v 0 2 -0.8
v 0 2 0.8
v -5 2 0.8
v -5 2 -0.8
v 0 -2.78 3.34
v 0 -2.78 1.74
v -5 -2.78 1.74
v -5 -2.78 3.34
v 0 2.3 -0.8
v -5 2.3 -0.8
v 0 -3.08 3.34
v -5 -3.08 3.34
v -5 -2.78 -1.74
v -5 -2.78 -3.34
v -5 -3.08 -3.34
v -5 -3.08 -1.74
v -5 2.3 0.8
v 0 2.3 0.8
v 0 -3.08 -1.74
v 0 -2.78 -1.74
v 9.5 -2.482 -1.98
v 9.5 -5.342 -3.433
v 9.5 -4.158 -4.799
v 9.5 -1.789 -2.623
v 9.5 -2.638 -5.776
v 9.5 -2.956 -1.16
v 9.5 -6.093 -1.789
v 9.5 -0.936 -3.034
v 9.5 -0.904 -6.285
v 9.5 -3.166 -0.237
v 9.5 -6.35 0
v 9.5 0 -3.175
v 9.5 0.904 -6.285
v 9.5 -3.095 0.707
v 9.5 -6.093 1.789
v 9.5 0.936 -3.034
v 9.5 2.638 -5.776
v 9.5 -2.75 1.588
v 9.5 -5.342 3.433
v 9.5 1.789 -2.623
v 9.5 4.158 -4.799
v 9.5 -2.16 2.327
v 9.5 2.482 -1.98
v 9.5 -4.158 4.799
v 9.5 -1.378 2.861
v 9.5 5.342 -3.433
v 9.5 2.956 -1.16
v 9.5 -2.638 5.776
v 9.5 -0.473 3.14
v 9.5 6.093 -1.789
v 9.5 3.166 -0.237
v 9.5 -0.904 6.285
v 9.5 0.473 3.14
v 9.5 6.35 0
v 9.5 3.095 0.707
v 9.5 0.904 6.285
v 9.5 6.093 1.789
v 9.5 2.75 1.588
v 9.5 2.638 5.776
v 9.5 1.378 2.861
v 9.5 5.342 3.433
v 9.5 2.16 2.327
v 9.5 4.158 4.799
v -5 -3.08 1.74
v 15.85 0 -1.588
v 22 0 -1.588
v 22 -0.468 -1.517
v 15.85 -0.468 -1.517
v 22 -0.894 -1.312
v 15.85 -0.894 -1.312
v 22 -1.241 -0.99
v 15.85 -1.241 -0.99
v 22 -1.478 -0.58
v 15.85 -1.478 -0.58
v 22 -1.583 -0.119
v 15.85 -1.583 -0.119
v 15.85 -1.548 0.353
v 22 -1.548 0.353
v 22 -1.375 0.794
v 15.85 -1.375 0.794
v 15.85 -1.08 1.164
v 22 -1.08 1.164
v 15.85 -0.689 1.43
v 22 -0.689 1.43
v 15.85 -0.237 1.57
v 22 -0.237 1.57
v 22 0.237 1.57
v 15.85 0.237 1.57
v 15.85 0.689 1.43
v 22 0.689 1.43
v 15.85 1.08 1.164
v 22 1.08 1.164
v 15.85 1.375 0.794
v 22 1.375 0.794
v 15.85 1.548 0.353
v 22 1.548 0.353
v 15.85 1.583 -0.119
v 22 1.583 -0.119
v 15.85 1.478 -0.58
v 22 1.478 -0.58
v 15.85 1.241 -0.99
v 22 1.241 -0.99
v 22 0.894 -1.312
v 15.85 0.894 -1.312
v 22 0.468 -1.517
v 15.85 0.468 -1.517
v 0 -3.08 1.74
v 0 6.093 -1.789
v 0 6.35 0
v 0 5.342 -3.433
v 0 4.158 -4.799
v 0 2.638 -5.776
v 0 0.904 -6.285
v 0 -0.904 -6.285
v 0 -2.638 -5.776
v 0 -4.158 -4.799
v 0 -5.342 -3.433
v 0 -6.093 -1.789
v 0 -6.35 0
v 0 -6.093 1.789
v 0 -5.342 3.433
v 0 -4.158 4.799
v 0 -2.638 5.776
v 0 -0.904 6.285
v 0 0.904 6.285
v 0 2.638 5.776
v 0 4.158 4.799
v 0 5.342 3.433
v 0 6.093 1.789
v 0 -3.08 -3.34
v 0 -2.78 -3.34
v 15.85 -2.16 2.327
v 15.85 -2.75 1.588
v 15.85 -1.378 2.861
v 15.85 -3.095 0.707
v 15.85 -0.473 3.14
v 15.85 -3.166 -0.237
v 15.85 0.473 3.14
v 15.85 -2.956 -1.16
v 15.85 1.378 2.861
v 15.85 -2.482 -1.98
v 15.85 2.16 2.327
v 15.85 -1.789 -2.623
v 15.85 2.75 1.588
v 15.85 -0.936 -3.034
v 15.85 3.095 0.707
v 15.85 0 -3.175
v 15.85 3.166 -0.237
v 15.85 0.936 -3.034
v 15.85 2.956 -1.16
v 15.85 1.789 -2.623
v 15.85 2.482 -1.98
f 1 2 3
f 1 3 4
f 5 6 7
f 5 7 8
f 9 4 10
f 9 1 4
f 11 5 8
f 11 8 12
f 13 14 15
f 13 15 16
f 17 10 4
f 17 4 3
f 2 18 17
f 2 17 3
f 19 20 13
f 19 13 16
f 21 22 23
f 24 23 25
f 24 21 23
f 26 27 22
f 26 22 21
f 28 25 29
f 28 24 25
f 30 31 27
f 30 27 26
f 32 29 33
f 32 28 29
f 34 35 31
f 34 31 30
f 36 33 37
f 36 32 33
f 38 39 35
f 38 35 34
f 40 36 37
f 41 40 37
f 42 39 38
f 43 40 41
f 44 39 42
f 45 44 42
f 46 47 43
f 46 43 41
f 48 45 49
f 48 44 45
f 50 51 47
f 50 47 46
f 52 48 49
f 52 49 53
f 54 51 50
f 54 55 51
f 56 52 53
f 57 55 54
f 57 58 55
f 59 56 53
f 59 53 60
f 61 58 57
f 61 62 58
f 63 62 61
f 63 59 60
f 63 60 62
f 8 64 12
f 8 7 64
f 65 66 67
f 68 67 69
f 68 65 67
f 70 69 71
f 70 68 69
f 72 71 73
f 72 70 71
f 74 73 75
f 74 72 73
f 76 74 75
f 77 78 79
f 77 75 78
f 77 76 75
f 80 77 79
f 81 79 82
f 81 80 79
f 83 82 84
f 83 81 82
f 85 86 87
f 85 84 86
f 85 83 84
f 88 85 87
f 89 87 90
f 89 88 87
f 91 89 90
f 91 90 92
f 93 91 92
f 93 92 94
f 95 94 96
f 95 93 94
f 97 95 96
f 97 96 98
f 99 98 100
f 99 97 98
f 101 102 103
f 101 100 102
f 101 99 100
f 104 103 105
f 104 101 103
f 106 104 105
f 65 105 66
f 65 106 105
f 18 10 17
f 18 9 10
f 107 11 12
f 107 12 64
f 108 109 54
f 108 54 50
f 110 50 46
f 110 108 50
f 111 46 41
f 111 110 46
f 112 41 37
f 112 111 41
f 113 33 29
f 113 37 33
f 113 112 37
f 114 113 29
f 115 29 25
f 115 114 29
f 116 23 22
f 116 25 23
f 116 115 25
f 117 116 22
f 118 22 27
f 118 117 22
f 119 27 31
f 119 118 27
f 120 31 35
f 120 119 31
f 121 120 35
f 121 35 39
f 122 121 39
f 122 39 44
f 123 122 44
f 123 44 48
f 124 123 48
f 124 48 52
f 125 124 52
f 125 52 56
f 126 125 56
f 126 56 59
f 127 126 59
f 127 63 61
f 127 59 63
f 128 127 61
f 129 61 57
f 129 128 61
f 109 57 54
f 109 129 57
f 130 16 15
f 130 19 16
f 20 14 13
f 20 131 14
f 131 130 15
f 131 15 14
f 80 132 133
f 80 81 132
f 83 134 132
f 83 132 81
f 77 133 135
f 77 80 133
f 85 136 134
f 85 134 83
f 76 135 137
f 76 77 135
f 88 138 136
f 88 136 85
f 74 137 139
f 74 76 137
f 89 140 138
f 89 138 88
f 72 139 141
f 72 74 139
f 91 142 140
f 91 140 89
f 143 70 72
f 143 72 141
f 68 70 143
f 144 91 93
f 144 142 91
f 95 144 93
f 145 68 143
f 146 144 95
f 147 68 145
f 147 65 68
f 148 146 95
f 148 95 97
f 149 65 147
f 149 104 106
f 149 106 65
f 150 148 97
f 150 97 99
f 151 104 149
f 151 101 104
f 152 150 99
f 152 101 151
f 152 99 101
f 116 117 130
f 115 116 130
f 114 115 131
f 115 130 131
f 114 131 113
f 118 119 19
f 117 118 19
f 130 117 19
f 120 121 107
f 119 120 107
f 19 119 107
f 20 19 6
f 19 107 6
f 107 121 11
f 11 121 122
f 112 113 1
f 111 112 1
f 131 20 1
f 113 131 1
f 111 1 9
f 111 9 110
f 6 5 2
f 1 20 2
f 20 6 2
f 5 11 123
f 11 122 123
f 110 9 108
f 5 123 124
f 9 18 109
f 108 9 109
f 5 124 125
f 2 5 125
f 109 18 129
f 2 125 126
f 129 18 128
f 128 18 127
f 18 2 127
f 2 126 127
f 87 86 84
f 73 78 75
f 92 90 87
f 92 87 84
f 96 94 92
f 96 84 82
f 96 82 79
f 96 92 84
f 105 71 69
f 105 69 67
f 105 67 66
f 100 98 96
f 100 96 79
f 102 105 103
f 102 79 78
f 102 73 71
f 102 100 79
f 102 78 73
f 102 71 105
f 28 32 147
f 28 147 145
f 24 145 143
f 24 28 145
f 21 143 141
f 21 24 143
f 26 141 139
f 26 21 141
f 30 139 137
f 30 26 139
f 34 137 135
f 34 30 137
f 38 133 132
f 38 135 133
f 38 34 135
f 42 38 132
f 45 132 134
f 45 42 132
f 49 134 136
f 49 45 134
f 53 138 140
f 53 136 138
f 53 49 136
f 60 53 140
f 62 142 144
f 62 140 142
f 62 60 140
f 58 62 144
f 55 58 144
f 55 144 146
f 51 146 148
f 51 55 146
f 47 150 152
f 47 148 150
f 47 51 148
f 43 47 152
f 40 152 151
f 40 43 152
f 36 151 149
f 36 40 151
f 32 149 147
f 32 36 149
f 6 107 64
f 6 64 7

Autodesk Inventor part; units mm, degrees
ref_plane "YZ Plane" through (0, 0, 0) normal (1, 0, 0) x (0, 1, 0)
ref_plane "XZ Plane" through (0, 0, 0) normal (0, 1, 0) x (-1, 0, 0)
ref_plane "XY Plane" through (0, 0, 0) normal (0, 0, 1) x (1, 0, 0)
sketch "Sketch1" plane through (0, 0, 0) normal (1, 0, 0) x (0, 1, 0)
  circle A0 centre (0, 0) radius 6.35
  dimension "d0" = 12.7
extrude "Extrusion1" add sketch "Sketch1" along normal blind 9.5
sketch "Sketch2" plane through (9.5, 0, 0) normal (1, 0, 0) x (0, 0, -1)
  circle A0 centre (0, 0) radius 1.5875
  dimension "d3" = 3.175
extrude "Extrusion2" add sketch "Sketch2" along normal blind 12.5
sketch "Sketch3" plane through (0, 0, 0) normal (-1, 0, 0) x (0, 0, 1)
  line L0 (-0.8, 2.3) -> (0.8, 2.3)
  line L1 (0.8, 2.3) -> (0.8, 2)
  line L2 (0.8, 2) -> (-0.8, 2)
  line L3 (-0.8, 2) -> (-0.8, 2.3)
  line L4 (-3.34, -2.78) -> (-1.74, -2.78)
  line L5 (-1.74, -2.78) -> (-1.74, -3.08)
  line L6 (-1.74, -3.08) -> (-3.34, -3.08)
  line L7 (-3.34, -3.08) -> (-3.34, -2.78)
  line L8 (1.74, -2.78) -> (3.34, -2.78)
  line L9 (3.34, -2.78) -> (3.34, -3.08)
  line L10 (3.34, -3.08) -> (1.74, -3.08)
  line L11 (1.74, -3.08) -> (1.74, -2.78)
  point P0 (0, 0)
  dimension "d6" = 1.6
  dimension "d7" = 0.3
  dimension "d8" = 0.3
  dimension "d9" = 1.6
  dimension "d10" = 1.6
  dimension "d11" = 0.3
  dimension "d12" = 0.8
  dimension "d13" = 2
  dimension "d14" = 4.78
  dimension "d15" = 0
  dimension "d16" = 3.48
  dimension "d17" = 1.74
extrude "Extrusion3" add sketch "Sketch3" along normal blind 5
sketch "Sketch4" plane through (9.5, 0, 0) normal (1, 0, 0) x (0, 0, -1)
  circle A0 centre (0, 0) radius 3.175
  dimension "d20" = 6.35
extrude "Extrusion4" add sketch "Sketch4" along normal blind 6.35
properties part number "Potentiometer"
